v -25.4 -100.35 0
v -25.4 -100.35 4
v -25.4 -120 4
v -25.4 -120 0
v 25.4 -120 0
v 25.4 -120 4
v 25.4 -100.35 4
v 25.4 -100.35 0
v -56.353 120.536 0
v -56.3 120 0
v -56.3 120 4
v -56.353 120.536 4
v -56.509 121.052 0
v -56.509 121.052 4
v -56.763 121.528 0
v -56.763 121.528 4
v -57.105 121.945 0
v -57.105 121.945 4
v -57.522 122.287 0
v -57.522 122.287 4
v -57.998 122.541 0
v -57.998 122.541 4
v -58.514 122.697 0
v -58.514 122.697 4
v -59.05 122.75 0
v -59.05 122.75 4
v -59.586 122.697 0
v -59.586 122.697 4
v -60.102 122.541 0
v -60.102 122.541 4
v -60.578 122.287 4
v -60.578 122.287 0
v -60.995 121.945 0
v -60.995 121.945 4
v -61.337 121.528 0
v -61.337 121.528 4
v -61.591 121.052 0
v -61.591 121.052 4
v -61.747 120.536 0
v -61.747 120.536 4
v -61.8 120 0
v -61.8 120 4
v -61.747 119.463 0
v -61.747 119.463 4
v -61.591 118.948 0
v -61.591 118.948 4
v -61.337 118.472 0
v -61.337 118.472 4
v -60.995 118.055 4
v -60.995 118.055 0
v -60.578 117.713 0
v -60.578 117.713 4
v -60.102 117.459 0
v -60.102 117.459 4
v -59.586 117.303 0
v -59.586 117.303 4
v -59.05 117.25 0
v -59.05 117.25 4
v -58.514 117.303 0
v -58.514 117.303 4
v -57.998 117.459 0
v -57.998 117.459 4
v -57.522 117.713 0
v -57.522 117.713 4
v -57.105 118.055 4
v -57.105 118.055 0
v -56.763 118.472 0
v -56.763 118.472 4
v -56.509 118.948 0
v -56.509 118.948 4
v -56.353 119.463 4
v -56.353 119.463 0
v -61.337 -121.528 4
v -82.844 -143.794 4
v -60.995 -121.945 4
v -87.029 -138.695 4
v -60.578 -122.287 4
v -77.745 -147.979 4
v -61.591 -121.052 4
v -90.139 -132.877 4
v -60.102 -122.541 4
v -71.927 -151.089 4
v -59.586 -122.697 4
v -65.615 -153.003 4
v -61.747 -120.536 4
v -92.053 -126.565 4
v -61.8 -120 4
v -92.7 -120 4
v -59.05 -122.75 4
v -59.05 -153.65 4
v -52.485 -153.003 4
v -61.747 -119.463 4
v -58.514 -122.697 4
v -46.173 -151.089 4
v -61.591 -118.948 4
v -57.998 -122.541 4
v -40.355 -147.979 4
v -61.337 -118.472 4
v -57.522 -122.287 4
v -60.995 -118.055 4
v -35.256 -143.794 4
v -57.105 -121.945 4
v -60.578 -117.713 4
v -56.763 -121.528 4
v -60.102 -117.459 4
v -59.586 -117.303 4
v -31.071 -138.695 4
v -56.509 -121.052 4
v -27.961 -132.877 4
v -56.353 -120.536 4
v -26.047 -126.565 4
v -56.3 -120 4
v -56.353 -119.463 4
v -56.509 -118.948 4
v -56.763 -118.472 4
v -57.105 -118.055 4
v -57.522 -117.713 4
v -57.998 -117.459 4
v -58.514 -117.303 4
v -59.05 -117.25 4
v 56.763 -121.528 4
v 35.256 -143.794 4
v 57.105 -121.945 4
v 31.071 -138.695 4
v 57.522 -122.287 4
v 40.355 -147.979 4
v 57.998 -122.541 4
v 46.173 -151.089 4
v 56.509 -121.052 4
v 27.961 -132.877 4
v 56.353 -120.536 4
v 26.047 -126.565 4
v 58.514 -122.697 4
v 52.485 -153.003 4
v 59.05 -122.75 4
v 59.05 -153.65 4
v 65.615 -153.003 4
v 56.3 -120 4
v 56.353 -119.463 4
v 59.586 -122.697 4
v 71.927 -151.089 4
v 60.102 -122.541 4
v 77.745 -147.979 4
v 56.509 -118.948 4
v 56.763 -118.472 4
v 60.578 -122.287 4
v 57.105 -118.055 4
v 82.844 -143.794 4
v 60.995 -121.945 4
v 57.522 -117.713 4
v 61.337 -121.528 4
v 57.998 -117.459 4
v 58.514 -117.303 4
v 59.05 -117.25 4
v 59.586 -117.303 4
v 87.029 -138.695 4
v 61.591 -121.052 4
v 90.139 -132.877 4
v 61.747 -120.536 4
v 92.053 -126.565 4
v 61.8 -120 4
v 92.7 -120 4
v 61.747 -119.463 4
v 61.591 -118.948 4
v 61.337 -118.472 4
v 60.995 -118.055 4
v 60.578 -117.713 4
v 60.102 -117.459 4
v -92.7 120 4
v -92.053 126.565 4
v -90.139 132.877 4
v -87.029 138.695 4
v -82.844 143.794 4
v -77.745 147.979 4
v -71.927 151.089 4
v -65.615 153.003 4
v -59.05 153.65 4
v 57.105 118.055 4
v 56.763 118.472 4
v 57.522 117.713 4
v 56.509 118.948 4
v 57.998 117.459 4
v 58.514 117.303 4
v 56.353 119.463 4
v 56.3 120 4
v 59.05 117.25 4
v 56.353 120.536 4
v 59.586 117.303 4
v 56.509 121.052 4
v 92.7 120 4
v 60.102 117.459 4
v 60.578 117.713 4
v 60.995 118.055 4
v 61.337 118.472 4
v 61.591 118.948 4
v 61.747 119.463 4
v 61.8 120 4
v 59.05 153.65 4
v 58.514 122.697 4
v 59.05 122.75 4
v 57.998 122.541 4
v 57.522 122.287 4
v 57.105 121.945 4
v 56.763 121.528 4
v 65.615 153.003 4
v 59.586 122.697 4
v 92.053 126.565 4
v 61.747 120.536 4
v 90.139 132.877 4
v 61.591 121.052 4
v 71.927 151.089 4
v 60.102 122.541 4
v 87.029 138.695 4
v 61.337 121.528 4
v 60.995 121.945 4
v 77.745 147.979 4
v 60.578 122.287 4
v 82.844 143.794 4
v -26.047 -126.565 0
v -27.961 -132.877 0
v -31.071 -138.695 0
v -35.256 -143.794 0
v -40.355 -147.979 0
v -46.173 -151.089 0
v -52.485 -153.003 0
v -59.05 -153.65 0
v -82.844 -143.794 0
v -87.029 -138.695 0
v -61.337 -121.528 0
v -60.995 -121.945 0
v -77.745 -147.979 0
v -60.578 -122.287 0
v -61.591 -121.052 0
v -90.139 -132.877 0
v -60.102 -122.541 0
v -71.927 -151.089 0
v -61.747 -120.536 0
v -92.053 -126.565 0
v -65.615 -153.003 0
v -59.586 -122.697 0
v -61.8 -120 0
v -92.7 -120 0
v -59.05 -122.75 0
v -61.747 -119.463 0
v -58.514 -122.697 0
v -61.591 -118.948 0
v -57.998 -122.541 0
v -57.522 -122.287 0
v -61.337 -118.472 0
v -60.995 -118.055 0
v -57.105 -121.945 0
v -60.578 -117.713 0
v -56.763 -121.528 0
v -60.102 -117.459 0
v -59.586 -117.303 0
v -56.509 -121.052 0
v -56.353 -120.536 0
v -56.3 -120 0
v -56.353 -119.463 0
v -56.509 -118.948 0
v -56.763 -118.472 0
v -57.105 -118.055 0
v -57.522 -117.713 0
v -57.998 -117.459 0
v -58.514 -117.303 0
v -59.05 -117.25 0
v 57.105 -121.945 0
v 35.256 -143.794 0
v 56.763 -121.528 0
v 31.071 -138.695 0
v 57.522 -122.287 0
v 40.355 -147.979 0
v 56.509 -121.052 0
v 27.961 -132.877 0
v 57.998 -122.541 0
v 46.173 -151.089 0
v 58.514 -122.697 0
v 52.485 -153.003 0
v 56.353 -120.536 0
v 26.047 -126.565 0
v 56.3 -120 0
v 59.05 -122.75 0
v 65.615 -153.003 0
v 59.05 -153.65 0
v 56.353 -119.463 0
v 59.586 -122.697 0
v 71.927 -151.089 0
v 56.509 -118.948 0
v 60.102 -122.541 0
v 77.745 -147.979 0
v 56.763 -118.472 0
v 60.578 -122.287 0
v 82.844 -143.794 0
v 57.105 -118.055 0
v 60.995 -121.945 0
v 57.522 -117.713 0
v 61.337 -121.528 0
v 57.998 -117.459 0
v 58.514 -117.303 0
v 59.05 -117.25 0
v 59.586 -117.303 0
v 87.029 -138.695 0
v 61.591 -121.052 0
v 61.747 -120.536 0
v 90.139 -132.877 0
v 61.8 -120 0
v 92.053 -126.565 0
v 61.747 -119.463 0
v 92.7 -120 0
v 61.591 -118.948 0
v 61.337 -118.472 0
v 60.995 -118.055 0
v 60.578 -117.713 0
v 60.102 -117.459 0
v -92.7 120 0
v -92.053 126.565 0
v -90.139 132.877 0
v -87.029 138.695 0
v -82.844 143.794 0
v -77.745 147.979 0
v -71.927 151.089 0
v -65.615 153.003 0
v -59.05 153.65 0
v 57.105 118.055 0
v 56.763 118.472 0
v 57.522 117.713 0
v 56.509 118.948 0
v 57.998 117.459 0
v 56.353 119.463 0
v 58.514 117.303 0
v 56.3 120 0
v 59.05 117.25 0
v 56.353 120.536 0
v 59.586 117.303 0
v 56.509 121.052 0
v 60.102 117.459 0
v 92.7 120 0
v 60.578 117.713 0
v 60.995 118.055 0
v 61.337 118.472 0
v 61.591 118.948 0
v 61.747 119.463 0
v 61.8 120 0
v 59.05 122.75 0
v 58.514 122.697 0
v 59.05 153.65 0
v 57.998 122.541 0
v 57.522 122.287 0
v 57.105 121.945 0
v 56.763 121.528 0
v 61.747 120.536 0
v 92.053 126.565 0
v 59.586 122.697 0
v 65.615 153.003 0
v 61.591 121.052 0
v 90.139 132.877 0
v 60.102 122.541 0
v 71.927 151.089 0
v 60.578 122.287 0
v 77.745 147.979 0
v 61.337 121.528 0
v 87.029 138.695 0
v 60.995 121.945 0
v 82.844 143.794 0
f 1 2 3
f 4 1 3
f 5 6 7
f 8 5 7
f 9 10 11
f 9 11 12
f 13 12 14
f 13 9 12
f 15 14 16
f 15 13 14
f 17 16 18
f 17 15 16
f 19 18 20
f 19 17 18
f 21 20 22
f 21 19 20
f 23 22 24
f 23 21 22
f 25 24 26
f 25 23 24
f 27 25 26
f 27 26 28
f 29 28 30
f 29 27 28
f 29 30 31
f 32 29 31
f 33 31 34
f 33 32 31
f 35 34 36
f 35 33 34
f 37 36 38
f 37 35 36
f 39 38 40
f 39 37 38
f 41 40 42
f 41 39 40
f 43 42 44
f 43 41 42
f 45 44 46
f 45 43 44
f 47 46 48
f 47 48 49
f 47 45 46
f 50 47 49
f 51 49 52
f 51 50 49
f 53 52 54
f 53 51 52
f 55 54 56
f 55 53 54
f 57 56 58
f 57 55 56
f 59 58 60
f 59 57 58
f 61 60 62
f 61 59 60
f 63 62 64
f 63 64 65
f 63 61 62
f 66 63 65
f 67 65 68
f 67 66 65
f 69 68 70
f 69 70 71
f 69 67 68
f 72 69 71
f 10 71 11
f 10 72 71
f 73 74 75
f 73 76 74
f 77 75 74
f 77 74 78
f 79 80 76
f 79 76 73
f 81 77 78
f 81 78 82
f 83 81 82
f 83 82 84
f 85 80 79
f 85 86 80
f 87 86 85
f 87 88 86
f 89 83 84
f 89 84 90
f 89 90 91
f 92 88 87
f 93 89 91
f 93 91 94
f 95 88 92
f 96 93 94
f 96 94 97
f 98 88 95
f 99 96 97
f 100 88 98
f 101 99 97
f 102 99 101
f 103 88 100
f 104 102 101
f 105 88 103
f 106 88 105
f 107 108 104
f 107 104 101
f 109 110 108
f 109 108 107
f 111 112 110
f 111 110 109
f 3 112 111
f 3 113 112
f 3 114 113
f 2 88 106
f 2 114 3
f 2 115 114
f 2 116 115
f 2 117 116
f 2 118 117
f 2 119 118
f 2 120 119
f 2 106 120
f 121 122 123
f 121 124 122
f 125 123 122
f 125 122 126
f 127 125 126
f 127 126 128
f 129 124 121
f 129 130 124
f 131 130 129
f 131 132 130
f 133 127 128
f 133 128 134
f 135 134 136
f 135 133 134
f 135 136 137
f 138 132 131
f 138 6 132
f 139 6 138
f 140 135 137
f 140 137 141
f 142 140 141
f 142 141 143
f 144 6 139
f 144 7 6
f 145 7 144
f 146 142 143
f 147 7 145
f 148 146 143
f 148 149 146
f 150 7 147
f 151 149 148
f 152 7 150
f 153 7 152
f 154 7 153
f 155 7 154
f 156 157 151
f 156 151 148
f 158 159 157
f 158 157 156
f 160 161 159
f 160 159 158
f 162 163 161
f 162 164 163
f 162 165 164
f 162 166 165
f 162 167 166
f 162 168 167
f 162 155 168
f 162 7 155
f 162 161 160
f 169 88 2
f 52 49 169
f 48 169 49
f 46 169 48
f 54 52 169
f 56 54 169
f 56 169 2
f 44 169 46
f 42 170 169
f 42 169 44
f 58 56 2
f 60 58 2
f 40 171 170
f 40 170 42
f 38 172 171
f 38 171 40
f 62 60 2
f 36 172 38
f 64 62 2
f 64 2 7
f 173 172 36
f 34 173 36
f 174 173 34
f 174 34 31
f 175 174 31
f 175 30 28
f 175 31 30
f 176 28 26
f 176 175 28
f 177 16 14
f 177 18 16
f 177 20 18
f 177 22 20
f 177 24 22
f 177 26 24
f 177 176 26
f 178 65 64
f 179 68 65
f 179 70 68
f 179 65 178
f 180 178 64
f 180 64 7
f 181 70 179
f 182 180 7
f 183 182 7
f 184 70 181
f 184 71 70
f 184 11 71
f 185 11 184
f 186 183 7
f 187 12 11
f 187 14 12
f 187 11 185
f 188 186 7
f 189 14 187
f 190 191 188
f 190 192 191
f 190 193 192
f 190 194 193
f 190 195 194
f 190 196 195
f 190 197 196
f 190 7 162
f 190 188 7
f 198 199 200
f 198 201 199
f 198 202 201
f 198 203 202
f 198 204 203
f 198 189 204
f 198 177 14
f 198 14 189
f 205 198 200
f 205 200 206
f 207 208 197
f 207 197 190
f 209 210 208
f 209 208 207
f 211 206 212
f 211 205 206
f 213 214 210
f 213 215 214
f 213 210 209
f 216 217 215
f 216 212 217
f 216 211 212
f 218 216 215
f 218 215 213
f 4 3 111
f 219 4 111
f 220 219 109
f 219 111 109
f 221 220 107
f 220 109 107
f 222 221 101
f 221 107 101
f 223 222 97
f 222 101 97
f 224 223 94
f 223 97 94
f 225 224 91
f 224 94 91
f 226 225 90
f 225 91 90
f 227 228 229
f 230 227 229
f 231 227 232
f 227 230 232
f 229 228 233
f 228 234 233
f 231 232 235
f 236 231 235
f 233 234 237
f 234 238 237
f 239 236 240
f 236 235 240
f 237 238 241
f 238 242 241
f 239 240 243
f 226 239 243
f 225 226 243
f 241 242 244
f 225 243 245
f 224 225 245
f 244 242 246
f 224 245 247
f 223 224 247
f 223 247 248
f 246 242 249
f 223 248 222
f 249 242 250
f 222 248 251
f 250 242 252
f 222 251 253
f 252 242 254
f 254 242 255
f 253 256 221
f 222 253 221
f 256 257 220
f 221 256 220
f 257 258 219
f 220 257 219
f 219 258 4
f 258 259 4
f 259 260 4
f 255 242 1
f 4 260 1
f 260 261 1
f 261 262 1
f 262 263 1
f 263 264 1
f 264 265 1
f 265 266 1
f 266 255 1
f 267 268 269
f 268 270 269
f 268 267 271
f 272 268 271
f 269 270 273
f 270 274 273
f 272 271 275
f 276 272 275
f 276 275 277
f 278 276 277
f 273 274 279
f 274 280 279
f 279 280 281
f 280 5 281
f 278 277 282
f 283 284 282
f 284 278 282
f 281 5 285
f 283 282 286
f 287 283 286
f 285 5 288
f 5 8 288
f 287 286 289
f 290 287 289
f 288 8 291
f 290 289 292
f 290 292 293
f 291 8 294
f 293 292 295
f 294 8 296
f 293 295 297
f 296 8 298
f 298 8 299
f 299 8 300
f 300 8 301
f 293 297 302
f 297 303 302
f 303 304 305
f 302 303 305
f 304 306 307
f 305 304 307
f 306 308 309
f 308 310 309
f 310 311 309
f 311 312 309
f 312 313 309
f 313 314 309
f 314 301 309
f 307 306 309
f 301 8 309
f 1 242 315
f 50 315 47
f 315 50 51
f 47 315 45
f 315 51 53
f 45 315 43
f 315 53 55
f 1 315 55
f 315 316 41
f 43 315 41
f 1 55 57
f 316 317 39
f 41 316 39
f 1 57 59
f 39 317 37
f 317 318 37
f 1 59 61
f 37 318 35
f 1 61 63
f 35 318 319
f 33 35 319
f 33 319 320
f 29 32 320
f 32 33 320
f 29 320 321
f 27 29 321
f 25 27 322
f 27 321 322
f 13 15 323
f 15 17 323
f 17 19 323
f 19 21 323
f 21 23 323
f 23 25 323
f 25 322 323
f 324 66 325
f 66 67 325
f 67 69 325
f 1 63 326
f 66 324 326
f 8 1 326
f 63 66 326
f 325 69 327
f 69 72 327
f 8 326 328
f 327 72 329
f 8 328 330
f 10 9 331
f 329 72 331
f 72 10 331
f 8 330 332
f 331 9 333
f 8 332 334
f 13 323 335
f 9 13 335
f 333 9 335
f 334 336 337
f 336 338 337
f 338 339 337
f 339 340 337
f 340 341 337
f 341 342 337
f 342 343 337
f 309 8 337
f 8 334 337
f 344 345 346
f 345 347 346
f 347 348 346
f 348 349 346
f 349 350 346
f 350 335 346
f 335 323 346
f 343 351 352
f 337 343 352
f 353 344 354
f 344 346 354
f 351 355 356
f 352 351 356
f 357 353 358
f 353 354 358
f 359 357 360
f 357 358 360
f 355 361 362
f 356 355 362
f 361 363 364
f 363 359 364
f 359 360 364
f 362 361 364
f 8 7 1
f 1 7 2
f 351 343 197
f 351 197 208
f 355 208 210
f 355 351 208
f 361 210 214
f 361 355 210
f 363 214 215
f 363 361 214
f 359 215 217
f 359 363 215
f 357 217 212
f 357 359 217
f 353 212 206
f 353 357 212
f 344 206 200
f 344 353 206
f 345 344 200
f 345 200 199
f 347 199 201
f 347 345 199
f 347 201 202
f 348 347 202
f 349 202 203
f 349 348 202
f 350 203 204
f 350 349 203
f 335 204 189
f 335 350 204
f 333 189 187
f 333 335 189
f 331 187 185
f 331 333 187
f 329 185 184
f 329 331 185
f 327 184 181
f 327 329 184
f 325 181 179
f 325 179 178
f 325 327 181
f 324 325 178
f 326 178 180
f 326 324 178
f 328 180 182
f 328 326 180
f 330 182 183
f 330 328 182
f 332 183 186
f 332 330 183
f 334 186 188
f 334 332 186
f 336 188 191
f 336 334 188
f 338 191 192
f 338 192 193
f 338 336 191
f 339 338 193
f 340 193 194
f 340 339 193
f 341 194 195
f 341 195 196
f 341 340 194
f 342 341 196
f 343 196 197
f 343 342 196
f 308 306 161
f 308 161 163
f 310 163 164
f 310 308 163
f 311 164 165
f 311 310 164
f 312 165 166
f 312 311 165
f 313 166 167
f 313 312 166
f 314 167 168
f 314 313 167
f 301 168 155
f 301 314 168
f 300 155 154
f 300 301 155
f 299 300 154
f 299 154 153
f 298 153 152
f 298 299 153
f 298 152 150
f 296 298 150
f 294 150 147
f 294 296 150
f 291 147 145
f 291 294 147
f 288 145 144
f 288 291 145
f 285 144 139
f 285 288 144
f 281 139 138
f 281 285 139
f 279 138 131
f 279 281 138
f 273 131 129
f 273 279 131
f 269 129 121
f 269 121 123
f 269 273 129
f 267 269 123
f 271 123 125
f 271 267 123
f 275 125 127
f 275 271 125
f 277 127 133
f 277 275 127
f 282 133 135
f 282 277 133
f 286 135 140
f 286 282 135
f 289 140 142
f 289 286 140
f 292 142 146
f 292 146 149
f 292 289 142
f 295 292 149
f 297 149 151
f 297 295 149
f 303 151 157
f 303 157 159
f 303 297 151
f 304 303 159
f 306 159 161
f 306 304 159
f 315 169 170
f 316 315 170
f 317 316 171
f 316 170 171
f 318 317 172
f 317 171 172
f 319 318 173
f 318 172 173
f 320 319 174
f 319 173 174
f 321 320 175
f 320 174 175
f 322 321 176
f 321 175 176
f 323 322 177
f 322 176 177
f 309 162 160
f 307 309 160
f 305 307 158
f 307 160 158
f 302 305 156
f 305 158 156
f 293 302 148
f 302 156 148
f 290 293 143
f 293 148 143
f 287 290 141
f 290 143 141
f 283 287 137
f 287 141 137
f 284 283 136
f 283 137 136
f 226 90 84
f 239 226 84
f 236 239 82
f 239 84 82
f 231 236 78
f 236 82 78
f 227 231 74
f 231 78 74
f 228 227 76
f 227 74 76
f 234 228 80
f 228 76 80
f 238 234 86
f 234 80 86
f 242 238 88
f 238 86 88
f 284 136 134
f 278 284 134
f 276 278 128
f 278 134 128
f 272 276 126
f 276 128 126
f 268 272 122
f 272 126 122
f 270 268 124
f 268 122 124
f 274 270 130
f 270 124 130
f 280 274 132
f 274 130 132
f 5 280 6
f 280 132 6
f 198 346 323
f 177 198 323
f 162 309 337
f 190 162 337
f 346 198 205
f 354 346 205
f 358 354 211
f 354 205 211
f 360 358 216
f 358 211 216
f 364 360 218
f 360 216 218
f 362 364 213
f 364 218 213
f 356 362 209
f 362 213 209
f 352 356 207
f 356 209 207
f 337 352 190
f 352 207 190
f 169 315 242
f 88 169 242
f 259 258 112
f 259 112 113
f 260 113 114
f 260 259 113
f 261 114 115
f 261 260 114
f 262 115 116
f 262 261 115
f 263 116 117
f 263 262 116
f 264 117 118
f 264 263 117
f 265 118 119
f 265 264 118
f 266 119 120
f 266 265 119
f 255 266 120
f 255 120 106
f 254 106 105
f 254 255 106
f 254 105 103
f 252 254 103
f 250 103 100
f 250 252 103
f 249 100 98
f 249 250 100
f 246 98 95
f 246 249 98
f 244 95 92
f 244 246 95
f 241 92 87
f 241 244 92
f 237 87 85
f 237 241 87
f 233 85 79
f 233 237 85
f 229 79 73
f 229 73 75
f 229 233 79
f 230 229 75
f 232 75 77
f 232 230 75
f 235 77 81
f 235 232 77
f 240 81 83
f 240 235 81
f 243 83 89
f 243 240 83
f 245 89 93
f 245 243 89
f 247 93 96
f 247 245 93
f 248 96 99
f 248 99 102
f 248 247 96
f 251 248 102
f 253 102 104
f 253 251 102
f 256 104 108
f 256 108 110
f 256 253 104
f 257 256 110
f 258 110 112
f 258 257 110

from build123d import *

# Parameters (mm, degrees)
F0_R     = 2.75
F1_DEPTH = 4
F2_W     = 287.6251339912
F2_H     = 352.3535430431
F3_DEPTH = 25
F5_DEPTH = 25


with BuildPart() as f1:
    # F0 (on Top) → F1 (new body)
    with BuildSketch(Plane.XY):
        with BuildLine():
            ThreePointArc((92.7, 122.49998), (83.576376234, 144.526356234), (61.55, 153.64998))
            Line((61.55, 153.64998), (-61.55, 153.64998))
            ThreePointArc((-61.55, 153.64998), (-83.576376234, 144.526356234), (-92.7, 122.49998))
            Line((-92.7, 122.49998), (-92.7, -122.49998))
            ThreePointArc((-92.7, -122.49998), (-83.576376234, -144.526356234), (-61.55, -153.64998))
            Line((-61.55, -153.64998), (61.55, -153.64998))
            ThreePointArc((61.55, -153.64998), (83.576376234, -144.526356234), (92.7, -122.49998))
            Line((92.7, -122.49998), (92.7, 122.49998))
        make_face()
        with Locations((-59.05, -119.99998)):
            Circle(F0_R, mode=Mode.SUBTRACT)
        with Locations((59.05, -119.99998)):
            Circle(F0_R, mode=Mode.SUBTRACT)
        with Locations((-59.05, 119.99998)):
            Circle(F0_R, mode=Mode.SUBTRACT)
        with Locations((59.05, 119.99998)):
            Circle(F0_R, mode=Mode.SUBTRACT)
    extrude(amount=F1_DEPTH)

    # F2 (on face) → F3 (cut)
    with BuildSketch(Plane.XY.offset(4)):
        Rectangle(F2_W, F2_H)
        with BuildLine():
            ThreePointArc((-92.7, 119.99998), (-82.8441431869, 143.7941231869), (-59.05, 153.64998))
            Line((-59.05, 153.64998), (59.05, 153.64998))
            ThreePointArc((59.05, 153.64998), (82.8441431869, 143.7941231869), (92.7, 119.99998))
            Line((92.7, 119.99998), (92.7, -119.99998))
            ThreePointArc((92.7, -119.99998), (82.8441431869, -143.7941231869), (59.05, -153.64998))
            Line((59.05, -153.64998), (-59.05, -153.64998))
            ThreePointArc((-59.05, -153.64998), (-82.8441431869, -143.7941231869), (-92.7, -119.99998))
            Line((-92.7, -119.99998), (-92.7, 119.99998))
        make_face(mode=Mode.SUBTRACT)
    extrude(amount=-F3_DEPTH, mode=Mode.SUBTRACT)

    # F4 (on face) → F5 (cut)
    with BuildSketch(Plane.XY.offset(4)):
        with BuildLine():
            ThreePointArc((59.05, -153.64998), (35.2558568131, -143.7941231869), (25.4, -119.99998))
            Line((25.4, -119.99998), (25.4, -100.35002))
            Line((25.4, -100.35002), (0, -100.35002))
            Line((0, -100.35002), (-25.4, -100.35002))
            Line((-25.4, -100.35002), (-25.4, -119.99998))
            ThreePointArc((-25.4, -119.99998), (-35.2558568131, -143.7941231869), (-59.05, -153.64998))
            Line((-59.05, -153.64998), (59.05, -153.64998))
        make_face()
    extrude(amount=-F5_DEPTH, mode=Mode.SUBTRACT)


solid = f1.part
